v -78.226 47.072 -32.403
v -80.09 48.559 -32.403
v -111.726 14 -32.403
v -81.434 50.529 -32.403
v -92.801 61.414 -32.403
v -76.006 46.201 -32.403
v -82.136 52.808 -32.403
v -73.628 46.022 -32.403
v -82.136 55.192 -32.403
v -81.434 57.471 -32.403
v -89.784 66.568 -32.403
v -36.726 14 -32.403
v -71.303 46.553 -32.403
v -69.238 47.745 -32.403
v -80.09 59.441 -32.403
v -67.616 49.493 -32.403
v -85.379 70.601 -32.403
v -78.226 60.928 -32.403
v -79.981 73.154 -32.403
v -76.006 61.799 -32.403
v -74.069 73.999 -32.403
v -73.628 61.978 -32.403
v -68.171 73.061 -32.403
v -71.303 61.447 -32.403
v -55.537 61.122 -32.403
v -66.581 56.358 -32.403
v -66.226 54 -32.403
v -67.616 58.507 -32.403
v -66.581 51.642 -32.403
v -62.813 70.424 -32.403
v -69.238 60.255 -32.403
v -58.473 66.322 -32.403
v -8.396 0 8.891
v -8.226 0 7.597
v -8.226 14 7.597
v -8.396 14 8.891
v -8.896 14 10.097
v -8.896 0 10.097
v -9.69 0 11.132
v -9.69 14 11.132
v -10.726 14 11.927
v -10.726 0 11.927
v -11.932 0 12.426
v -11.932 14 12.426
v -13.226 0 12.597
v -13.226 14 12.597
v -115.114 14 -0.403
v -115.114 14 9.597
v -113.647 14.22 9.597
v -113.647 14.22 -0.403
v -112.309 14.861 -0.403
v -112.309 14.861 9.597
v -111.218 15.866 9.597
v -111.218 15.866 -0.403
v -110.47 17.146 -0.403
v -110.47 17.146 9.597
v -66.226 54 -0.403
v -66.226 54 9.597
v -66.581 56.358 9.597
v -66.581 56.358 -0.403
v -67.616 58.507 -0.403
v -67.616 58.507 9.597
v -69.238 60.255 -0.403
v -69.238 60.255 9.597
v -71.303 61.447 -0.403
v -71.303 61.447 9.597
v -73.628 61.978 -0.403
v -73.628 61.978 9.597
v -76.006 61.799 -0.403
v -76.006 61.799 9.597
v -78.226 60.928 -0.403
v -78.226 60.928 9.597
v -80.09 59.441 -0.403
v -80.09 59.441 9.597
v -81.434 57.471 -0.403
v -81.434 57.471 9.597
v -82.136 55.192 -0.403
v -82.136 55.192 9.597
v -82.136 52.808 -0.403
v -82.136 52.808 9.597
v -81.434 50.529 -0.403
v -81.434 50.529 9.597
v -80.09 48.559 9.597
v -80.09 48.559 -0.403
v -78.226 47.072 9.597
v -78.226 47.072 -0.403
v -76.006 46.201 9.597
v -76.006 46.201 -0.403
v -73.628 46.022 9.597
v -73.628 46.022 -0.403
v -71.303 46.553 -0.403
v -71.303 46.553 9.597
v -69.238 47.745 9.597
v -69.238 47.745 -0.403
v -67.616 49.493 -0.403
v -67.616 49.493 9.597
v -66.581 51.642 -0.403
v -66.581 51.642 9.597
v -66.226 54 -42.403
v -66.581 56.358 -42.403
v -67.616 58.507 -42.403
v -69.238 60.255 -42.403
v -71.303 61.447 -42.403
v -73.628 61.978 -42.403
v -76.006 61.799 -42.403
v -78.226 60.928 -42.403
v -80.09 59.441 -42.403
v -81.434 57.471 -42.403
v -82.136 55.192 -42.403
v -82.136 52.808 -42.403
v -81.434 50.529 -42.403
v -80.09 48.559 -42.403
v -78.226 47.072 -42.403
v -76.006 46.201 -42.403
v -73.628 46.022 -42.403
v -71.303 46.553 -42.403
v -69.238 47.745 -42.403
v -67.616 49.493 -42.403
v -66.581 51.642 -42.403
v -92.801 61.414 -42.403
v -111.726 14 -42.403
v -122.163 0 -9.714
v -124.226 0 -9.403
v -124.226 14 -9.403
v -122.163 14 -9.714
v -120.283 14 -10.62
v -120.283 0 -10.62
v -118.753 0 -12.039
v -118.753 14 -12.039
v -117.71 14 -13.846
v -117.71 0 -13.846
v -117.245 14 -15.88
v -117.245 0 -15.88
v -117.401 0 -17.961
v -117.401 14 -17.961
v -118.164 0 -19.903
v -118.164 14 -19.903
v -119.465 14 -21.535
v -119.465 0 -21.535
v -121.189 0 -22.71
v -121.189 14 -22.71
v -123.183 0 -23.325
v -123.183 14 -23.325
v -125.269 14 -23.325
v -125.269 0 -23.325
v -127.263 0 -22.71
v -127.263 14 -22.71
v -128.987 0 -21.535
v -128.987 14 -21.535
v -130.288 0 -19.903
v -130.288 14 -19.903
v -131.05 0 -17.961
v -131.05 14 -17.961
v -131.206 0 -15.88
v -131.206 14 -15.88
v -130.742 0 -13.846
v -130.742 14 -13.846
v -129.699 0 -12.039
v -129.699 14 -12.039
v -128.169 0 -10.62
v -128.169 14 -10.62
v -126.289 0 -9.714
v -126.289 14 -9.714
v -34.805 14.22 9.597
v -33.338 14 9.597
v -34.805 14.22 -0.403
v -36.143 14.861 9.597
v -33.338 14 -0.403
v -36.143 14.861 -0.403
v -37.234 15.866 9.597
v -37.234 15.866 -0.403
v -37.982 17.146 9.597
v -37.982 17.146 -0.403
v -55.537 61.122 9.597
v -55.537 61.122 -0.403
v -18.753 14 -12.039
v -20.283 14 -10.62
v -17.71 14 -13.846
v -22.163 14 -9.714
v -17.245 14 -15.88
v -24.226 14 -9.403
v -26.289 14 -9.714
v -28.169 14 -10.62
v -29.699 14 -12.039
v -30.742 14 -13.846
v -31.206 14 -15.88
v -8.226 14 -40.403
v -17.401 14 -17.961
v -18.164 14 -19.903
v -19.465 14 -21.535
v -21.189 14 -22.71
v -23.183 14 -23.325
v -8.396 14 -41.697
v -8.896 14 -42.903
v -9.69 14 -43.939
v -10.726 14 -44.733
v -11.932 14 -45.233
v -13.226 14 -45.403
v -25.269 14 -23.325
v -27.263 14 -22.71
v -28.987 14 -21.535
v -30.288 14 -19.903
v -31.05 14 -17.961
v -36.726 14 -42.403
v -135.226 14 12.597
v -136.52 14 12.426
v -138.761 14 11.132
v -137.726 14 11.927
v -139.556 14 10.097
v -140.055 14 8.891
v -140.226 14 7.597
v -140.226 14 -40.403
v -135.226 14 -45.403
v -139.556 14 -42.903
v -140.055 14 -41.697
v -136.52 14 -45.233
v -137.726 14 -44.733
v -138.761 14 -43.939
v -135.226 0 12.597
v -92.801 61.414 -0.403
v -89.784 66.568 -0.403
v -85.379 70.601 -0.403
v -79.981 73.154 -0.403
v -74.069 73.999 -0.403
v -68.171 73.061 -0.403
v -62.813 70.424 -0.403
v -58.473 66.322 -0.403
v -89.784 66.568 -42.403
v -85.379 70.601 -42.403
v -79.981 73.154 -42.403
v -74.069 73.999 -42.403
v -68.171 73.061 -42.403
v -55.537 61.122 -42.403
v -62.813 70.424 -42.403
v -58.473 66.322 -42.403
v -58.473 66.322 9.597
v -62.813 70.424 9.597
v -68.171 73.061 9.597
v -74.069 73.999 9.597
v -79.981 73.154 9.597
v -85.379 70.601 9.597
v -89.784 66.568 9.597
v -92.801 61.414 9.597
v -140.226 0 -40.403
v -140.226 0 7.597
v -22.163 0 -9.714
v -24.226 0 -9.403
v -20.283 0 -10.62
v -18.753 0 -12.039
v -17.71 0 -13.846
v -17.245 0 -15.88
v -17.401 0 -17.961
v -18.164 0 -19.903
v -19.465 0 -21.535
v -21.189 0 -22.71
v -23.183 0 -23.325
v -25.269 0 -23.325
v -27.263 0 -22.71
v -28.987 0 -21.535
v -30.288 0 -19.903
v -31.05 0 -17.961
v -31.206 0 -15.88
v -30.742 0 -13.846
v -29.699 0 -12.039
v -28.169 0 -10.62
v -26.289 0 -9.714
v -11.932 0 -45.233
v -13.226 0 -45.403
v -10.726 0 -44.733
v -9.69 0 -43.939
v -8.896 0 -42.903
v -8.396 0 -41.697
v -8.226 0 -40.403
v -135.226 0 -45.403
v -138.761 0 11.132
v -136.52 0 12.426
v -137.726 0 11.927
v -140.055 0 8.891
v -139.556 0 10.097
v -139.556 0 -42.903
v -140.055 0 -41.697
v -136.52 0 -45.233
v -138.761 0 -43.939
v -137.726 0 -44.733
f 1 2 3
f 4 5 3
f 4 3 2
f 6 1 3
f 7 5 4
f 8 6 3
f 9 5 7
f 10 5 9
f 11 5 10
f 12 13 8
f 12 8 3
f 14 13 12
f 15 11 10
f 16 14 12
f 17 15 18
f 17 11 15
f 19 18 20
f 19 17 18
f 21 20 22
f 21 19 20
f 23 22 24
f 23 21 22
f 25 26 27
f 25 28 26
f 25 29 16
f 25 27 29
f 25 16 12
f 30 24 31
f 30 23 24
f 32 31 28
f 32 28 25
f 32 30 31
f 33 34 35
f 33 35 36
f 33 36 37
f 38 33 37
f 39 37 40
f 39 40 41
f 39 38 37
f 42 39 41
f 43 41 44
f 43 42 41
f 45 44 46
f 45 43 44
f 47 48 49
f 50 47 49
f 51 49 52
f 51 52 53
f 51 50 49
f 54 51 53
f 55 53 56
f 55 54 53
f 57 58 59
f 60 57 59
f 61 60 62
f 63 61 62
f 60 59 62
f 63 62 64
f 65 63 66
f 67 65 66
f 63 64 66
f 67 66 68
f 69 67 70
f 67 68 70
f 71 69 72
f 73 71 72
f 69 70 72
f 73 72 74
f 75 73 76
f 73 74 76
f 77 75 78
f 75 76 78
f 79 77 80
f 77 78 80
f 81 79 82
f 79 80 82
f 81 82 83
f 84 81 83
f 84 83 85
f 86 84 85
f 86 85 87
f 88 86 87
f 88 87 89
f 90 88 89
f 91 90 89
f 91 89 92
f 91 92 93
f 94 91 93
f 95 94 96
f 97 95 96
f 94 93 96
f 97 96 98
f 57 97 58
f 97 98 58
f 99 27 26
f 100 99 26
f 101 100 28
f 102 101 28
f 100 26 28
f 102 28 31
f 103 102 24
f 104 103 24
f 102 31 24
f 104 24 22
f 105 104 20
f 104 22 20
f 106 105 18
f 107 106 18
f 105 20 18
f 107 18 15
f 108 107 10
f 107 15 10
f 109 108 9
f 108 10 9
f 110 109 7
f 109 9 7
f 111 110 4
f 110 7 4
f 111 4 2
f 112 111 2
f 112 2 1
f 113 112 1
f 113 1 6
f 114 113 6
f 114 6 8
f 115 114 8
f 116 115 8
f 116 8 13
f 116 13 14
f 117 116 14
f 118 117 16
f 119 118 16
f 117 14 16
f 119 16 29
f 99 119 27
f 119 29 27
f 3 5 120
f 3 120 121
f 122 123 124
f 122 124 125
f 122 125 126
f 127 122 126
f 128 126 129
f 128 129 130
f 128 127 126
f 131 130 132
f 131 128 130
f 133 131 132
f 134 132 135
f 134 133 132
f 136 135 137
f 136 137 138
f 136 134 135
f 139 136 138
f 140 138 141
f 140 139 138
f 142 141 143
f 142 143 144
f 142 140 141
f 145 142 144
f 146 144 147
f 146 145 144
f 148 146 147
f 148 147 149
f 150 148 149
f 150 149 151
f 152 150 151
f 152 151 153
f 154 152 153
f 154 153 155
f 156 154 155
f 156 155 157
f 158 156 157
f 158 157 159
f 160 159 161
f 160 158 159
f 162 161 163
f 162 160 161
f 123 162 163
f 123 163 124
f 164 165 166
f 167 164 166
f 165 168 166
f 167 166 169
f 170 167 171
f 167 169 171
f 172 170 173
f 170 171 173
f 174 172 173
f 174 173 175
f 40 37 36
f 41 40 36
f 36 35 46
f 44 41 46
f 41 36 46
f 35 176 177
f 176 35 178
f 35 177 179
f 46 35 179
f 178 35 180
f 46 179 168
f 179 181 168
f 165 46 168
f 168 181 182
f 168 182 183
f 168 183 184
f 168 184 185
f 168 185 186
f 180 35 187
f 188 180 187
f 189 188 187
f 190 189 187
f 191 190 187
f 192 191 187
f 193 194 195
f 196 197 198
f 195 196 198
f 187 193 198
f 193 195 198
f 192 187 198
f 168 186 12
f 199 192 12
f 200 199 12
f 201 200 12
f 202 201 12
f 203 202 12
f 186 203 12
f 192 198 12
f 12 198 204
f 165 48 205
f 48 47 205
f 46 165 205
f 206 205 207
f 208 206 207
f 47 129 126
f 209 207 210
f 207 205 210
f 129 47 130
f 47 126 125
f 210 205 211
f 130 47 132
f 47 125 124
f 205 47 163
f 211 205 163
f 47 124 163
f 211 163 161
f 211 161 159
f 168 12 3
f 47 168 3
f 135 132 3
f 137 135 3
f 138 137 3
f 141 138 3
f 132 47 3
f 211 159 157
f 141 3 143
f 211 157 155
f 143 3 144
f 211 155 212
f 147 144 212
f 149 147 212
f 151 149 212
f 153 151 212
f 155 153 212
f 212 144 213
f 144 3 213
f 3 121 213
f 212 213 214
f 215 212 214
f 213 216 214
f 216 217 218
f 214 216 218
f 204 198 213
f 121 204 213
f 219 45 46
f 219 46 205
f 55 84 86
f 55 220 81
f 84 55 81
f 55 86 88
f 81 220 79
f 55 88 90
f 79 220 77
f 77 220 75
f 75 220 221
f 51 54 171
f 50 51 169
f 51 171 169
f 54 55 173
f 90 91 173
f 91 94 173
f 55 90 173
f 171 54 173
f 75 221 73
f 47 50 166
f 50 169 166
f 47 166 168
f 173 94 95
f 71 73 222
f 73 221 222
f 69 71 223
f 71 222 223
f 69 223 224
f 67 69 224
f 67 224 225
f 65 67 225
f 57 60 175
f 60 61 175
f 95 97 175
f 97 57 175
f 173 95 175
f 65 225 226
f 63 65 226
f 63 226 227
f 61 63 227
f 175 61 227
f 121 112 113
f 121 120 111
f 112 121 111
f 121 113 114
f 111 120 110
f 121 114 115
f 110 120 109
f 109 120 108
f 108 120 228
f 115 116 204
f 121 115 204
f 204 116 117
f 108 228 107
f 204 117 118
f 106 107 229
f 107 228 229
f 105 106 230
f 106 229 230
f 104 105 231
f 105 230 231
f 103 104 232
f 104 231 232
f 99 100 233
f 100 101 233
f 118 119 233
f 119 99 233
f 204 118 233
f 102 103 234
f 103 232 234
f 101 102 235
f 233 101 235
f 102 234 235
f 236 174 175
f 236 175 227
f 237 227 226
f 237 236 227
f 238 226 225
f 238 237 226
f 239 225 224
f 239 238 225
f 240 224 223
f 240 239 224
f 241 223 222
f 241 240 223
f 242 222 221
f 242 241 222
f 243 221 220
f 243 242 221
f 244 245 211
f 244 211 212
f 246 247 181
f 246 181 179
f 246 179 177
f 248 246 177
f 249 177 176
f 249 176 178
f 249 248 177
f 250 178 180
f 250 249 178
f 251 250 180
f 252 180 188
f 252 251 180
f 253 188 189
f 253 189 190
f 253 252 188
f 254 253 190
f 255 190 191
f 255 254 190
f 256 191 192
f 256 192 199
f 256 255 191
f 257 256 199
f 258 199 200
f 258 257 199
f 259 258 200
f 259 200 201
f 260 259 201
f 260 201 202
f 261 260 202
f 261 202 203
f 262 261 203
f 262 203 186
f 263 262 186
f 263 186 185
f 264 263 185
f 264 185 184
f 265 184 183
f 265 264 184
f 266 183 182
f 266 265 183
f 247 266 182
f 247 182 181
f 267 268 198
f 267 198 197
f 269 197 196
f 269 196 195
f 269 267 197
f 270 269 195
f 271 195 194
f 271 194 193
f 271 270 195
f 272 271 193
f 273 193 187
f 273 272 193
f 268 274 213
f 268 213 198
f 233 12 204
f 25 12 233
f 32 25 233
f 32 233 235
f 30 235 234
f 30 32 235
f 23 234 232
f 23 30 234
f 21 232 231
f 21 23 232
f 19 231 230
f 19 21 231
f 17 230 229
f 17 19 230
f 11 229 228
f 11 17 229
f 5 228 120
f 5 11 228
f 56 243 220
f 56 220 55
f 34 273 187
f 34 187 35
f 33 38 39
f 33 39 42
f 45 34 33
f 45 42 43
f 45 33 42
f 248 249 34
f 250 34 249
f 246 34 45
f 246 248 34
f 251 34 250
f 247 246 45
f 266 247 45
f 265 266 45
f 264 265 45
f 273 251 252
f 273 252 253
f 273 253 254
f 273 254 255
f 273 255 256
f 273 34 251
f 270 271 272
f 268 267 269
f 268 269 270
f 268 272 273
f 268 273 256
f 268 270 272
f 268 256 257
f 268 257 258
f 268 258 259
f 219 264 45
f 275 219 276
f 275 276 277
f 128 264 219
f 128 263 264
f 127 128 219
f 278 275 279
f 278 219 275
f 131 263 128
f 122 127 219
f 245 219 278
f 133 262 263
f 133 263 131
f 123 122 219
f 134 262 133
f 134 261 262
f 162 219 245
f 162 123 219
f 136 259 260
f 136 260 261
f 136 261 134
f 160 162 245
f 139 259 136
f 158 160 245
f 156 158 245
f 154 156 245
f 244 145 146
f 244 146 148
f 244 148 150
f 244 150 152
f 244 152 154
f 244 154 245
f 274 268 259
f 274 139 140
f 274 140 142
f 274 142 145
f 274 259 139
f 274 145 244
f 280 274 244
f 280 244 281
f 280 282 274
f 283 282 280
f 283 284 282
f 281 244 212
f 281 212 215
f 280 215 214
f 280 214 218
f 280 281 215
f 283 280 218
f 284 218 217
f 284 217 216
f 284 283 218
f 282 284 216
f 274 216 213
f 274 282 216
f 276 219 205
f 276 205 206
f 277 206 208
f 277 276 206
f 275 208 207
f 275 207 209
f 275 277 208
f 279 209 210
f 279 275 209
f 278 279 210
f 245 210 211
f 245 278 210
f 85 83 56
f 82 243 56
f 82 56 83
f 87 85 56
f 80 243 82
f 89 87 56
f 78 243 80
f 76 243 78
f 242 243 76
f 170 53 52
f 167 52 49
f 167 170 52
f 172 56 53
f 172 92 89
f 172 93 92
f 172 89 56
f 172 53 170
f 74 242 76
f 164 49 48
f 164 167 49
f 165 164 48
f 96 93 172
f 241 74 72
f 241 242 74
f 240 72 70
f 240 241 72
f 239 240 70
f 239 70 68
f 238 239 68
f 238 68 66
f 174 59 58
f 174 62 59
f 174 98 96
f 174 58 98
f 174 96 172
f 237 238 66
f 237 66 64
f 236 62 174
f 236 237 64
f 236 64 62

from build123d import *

# Parameters (mm, degrees)
IZIM1_R                     = 7
Y_KSEKLIK_EKSTR_ZYON1_DEPTH = 14
Y_KSEKLIK_EKSTR_ZYON3_START = -3
IZIM5_R                     = 8
Y_KSEKLIK_EKSTR_ZYON3_DEPTH = 10
RADYUS1_R                   = 5
L_O_ALTMA1_COUNT            = 2
L_O_ALTMA1_PITCH            = 42


with BuildPart() as part:
    # Çizim1 → Yükseklik-Ekstrüzyon1 (new body)
    with BuildSketch(Plane(origin=(0, 0, 0), x_dir=(1, 0, 0), z_dir=(0, 1, 0))):
        with BuildLine():
            Line((-135.225806452, 45.403225806), (-13.225806452, 45.403225806))
            ThreePointArc((-13.225806452, 45.403225806), (-9.690272546, 43.938759712), (-8.225806452, 40.403225806))
            Line((-8.225806452, 40.403225806), (-8.225806452, -7.596774194))
            ThreePointArc((-8.225806452, -7.596774194), (-9.690272546, -11.132308099), (-13.225806452, -12.596774194))
            Line((-13.225806452, -12.596774194), (-135.225806452, -12.596774194))
            ThreePointArc((-135.225806452, -12.596774194), (-138.761340358, -11.132308099), (-140.225806452, -7.596774194))
            Line((-140.225806452, -7.596774194), (-140.225806452, 40.403225806))
            ThreePointArc((-140.225806452, 40.403225806), (-138.761340358, 43.938759712), (-135.225806452, 45.403225806))
        make_face()
        with Locations(Location((-124.225806452, 16.403225806, 0), (0, 0, 270))):
            Circle(IZIM1_R, mode=Mode.SUBTRACT)
        with Locations(Location((-24.225806452, 16.403225806, 0), (0, 0, 270))):
            Circle(IZIM1_R, mode=Mode.SUBTRACT)
    extrude(amount=Y_KSEKLIK_EKSTR_ZYON1_DEPTH)

    # Çizim5 → Yükseklik-Ekstrüzyon3 (add)
    with BuildSketch(Plane.XY.offset(12.596774194).offset(Y_KSEKLIK_EKSTR_ZYON3_START)):
        with BuildLine():
            ThreePointArc((-55.536681856, 61.121560352), (-74.068812399, 73.999383812), (-92.800827063, 61.414081823))
            Line((-92.800827063, 61.414081823), (-111.725806452, 14))
            Line((-111.725806452, 14), (-36.725806452, 14))
            Line((-36.725806452, 14), (-55.536681856, 61.121560352))
        make_face()
        with Locations((-74.225806452, 54)):
            Circle(IZIM5_R, mode=Mode.SUBTRACT)
    y_kseklik_ekstr_zyon3 = extrude(amount=-Y_KSEKLIK_EKSTR_ZYON3_DEPTH)

    # Radyus1
    radyus1_edges = [part.edges().sort_by_distance(p)[0] for p in [
        (-36.725806452, 14, 4.596774194),
        (-111.725806452, 14, 4.596774194),
    ]]
    fillet(radyus1_edges, radius=RADYUS1_R)

    # LÇoğaltma1: Yükseklik-Ekstrüzyon3 ×2
    with Locations(*[(0, 0, -i * L_O_ALTMA1_PITCH) for i in range(1, L_O_ALTMA1_COUNT)]):
        add(y_kseklik_ekstr_zyon3)


solid = part.part
